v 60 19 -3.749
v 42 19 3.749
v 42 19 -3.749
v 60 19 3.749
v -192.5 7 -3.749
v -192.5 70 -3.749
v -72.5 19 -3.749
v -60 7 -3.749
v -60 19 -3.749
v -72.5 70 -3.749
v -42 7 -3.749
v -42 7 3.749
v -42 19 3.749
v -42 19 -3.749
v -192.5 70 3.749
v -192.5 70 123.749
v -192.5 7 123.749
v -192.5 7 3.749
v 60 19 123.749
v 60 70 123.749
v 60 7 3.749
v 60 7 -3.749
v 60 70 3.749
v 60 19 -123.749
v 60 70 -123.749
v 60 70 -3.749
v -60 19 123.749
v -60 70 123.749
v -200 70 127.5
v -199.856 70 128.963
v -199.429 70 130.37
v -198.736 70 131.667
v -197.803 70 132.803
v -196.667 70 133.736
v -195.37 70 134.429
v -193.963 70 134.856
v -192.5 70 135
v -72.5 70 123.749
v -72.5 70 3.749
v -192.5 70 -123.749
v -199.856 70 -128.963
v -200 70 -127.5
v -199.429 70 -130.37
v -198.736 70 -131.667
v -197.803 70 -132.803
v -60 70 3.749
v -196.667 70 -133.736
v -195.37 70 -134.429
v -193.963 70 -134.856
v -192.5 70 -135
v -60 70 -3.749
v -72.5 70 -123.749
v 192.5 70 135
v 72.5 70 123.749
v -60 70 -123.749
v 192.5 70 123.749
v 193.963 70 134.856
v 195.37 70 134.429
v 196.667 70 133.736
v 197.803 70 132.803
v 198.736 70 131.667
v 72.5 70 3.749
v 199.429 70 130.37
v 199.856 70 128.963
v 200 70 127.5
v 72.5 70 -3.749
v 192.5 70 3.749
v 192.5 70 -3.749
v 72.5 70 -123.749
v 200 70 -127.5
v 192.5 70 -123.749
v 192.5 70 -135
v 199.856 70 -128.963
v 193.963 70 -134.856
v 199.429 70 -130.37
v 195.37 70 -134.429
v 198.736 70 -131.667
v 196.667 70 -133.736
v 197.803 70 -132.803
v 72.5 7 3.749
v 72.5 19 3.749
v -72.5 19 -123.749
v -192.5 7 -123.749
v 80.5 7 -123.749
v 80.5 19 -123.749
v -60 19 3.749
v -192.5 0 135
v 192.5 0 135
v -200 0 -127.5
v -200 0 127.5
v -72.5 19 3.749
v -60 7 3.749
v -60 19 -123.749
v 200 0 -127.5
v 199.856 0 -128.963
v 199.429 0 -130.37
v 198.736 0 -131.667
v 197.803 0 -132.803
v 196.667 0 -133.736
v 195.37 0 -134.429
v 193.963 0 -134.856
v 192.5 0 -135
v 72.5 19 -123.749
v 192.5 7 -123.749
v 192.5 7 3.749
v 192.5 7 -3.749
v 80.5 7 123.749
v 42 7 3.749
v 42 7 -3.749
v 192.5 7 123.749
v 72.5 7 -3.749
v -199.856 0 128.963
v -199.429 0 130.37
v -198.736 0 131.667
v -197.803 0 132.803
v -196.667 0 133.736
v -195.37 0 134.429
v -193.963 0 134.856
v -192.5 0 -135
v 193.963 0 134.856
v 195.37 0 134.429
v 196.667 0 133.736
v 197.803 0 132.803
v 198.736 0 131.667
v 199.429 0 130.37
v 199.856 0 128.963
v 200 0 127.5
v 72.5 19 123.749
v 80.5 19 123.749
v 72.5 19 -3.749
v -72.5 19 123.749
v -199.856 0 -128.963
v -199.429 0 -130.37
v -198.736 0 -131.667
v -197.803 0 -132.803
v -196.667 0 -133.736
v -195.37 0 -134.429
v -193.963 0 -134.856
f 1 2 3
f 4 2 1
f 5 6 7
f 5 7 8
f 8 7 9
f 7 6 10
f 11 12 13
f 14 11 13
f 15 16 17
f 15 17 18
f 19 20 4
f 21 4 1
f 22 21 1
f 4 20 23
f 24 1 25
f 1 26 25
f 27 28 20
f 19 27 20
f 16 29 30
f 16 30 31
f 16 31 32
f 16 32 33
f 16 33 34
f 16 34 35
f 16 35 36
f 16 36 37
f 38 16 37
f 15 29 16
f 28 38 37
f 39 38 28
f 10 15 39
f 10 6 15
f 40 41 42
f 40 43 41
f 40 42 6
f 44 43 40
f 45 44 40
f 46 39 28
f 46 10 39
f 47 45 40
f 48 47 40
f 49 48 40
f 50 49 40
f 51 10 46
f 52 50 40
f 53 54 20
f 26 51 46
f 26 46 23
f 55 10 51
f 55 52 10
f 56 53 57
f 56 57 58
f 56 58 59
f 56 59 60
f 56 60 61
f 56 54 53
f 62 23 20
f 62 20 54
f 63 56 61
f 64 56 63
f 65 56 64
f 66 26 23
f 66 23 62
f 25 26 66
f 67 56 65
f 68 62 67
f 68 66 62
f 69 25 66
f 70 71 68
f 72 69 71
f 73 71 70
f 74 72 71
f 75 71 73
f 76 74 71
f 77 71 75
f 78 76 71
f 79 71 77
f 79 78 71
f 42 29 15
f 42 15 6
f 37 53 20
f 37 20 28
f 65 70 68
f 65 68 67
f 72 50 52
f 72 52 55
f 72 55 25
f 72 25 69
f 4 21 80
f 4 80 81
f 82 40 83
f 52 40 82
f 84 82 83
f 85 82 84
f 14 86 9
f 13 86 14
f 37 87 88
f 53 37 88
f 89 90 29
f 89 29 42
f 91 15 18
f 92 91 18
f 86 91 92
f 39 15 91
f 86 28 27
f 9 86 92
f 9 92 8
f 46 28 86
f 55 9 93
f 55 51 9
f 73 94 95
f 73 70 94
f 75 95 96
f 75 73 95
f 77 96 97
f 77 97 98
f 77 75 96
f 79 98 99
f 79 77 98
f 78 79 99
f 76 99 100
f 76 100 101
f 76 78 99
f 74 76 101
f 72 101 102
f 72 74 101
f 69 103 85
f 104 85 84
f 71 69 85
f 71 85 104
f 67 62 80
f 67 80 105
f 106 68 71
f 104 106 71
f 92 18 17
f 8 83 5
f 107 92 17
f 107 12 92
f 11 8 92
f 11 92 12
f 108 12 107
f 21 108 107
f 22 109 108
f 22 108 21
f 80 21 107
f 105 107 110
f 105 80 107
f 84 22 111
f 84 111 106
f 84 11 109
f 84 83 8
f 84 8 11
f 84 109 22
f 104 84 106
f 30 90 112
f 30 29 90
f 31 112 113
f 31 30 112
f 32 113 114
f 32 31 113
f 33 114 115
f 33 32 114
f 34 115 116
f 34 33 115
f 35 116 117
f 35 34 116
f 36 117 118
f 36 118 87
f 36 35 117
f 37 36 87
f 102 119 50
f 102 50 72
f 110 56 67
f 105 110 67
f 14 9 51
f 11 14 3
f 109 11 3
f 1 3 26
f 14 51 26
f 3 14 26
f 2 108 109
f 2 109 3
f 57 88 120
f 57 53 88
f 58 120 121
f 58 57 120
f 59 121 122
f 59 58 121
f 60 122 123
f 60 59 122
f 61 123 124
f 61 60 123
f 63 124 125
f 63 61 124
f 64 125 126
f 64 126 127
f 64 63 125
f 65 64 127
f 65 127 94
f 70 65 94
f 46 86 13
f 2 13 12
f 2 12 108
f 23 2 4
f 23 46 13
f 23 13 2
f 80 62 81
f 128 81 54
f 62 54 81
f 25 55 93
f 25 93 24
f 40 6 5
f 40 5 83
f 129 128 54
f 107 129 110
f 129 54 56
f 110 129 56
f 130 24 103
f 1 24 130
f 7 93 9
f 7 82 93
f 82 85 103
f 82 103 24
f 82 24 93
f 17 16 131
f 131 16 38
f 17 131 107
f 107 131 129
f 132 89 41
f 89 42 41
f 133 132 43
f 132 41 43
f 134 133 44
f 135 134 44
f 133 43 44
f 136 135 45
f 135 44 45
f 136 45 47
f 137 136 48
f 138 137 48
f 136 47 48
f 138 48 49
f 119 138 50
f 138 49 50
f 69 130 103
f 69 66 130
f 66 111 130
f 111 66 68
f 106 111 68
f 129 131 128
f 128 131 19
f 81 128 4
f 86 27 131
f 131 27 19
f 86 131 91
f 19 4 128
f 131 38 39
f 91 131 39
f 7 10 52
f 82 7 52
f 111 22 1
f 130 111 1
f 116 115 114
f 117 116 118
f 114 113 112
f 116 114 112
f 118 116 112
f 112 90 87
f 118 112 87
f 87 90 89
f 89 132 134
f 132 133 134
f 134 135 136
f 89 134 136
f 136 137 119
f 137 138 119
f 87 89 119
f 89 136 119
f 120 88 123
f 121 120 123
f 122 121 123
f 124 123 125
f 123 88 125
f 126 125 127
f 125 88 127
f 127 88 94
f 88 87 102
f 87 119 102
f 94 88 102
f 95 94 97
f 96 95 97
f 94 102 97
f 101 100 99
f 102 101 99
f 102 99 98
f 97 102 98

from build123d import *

# Parameters (mm, degrees)
SKETCH1_W           = 400
SKETCH1_H           = 270
BOSS_EXTRUDE1_DEPTH = 70
FILLET1_R           = 7.5
SKETCH3_W           = 120
SKETCH3_H           = 120
CUT_EXTRUDE1_DEPTH  = 63
SKETCH5_W           = 120
SKETCH5_H           = 12
CUT_EXTRUDE2_DEPTH  = 153
SKETCH6_W           = 120
SKETCH6_H           = 12
CUT_EXTRUDE3_DEPTH  = 153
CUT_EXTRUDE4_REACH  = 255.281
SKETCH7_W           = 18
SKETCH7_H           = 12


with BuildPart() as part:
    # Sketch1 → Boss-Extrude1 (new body)
    with BuildSketch(Plane(origin=(0, 0, 0), x_dir=(1, 0, 0), z_dir=(0, 1, 0))):
        Rectangle(SKETCH1_W, SKETCH1_H)
    extrude(amount=BOSS_EXTRUDE1_DEPTH)

    # Fillet1
    fillet1_edges = [part.edges().sort_by_distance(p)[0] for p in [
        (-200, 35, -135),
        (200, 35, -135),
        (200, 35, 135),
        (-200, 35, 135),
    ]]
    fillet(fillet1_edges, radius=FILLET1_R)

    # Sketch3 → Cut-Extrude1 (cut)
    with BuildSketch(Plane(origin=(0, 70, 0), x_dir=(1, 0, 0), z_dir=(0, 1, 0))):
        with Locations((0, 63.749469805)):
            Rectangle(SKETCH3_W, SKETCH3_H)
        with Locations((-132.500014476, 63.749478681)):
            Rectangle(SKETCH3_W, SKETCH3_H)
        with Locations((132.500029203, 63.749477903)):
            Rectangle(SKETCH3_W, SKETCH3_H)
        with Locations((132.500029203, -63.749477903)):
            Rectangle(SKETCH3_W, SKETCH3_H)
        with Locations((0, -63.749469805)):
            Rectangle(SKETCH3_W, SKETCH3_H)
        with Locations((-132.500014476, -63.749478681)):
            Rectangle(SKETCH3_W, SKETCH3_H)
    extrude(amount=-CUT_EXTRUDE1_DEPTH, mode=Mode.SUBTRACT)

    # Sketch5 → Cut-Extrude2 (cut)
    with BuildSketch(Plane.ZY.offset(72.500014476)):
        with Locations((-63.749478681, 13)):
            Rectangle(SKETCH5_W, SKETCH5_H)
    extrude(amount=-CUT_EXTRUDE2_DEPTH, mode=Mode.SUBTRACT)

    # Sketch6 → Cut-Extrude3 (cut)
    with BuildSketch(Plane.ZY.offset(72.500014476)):
        with Locations((63.749478681, 13)):
            Rectangle(SKETCH6_W, SKETCH6_H)
    extrude(amount=-CUT_EXTRUDE3_DEPTH, mode=Mode.SUBTRACT)

    # Sketch7 → Cut-Extrude4 (cut, up to next)
    with BuildSketch(Plane.XY.offset(3.749477903), mode=Mode.PRIVATE) as cut_extrude4_sk1:
        with Locations((-51, 13)):
            Rectangle(SKETCH7_W, SKETCH7_H)
    cut_extrude4_tool1 = extrude(cut_extrude4_sk1.sketch, amount=-CUT_EXTRUDE4_REACH, mode=Mode.PRIVATE) & part.part
    # Sketch7 → Cut-Extrude4 (cut, up to next)
    with BuildSketch(Plane.XY.offset(3.749477903), mode=Mode.PRIVATE) as cut_extrude4_sk2:
        with Locations((51, 13)):
            Rectangle(SKETCH7_W, SKETCH7_H)
    cut_extrude4_tool2 = extrude(cut_extrude4_sk2.sketch, amount=-CUT_EXTRUDE4_REACH, mode=Mode.PRIVATE) & part.part
    add(cut_extrude4_tool1.solids().sort_by_distance((-51, 13, 3.749478))[0], mode=Mode.SUBTRACT)
    add(cut_extrude4_tool2.solids().sort_by_distance((51, 13, 3.749478))[0], mode=Mode.SUBTRACT)


solid = part.part
